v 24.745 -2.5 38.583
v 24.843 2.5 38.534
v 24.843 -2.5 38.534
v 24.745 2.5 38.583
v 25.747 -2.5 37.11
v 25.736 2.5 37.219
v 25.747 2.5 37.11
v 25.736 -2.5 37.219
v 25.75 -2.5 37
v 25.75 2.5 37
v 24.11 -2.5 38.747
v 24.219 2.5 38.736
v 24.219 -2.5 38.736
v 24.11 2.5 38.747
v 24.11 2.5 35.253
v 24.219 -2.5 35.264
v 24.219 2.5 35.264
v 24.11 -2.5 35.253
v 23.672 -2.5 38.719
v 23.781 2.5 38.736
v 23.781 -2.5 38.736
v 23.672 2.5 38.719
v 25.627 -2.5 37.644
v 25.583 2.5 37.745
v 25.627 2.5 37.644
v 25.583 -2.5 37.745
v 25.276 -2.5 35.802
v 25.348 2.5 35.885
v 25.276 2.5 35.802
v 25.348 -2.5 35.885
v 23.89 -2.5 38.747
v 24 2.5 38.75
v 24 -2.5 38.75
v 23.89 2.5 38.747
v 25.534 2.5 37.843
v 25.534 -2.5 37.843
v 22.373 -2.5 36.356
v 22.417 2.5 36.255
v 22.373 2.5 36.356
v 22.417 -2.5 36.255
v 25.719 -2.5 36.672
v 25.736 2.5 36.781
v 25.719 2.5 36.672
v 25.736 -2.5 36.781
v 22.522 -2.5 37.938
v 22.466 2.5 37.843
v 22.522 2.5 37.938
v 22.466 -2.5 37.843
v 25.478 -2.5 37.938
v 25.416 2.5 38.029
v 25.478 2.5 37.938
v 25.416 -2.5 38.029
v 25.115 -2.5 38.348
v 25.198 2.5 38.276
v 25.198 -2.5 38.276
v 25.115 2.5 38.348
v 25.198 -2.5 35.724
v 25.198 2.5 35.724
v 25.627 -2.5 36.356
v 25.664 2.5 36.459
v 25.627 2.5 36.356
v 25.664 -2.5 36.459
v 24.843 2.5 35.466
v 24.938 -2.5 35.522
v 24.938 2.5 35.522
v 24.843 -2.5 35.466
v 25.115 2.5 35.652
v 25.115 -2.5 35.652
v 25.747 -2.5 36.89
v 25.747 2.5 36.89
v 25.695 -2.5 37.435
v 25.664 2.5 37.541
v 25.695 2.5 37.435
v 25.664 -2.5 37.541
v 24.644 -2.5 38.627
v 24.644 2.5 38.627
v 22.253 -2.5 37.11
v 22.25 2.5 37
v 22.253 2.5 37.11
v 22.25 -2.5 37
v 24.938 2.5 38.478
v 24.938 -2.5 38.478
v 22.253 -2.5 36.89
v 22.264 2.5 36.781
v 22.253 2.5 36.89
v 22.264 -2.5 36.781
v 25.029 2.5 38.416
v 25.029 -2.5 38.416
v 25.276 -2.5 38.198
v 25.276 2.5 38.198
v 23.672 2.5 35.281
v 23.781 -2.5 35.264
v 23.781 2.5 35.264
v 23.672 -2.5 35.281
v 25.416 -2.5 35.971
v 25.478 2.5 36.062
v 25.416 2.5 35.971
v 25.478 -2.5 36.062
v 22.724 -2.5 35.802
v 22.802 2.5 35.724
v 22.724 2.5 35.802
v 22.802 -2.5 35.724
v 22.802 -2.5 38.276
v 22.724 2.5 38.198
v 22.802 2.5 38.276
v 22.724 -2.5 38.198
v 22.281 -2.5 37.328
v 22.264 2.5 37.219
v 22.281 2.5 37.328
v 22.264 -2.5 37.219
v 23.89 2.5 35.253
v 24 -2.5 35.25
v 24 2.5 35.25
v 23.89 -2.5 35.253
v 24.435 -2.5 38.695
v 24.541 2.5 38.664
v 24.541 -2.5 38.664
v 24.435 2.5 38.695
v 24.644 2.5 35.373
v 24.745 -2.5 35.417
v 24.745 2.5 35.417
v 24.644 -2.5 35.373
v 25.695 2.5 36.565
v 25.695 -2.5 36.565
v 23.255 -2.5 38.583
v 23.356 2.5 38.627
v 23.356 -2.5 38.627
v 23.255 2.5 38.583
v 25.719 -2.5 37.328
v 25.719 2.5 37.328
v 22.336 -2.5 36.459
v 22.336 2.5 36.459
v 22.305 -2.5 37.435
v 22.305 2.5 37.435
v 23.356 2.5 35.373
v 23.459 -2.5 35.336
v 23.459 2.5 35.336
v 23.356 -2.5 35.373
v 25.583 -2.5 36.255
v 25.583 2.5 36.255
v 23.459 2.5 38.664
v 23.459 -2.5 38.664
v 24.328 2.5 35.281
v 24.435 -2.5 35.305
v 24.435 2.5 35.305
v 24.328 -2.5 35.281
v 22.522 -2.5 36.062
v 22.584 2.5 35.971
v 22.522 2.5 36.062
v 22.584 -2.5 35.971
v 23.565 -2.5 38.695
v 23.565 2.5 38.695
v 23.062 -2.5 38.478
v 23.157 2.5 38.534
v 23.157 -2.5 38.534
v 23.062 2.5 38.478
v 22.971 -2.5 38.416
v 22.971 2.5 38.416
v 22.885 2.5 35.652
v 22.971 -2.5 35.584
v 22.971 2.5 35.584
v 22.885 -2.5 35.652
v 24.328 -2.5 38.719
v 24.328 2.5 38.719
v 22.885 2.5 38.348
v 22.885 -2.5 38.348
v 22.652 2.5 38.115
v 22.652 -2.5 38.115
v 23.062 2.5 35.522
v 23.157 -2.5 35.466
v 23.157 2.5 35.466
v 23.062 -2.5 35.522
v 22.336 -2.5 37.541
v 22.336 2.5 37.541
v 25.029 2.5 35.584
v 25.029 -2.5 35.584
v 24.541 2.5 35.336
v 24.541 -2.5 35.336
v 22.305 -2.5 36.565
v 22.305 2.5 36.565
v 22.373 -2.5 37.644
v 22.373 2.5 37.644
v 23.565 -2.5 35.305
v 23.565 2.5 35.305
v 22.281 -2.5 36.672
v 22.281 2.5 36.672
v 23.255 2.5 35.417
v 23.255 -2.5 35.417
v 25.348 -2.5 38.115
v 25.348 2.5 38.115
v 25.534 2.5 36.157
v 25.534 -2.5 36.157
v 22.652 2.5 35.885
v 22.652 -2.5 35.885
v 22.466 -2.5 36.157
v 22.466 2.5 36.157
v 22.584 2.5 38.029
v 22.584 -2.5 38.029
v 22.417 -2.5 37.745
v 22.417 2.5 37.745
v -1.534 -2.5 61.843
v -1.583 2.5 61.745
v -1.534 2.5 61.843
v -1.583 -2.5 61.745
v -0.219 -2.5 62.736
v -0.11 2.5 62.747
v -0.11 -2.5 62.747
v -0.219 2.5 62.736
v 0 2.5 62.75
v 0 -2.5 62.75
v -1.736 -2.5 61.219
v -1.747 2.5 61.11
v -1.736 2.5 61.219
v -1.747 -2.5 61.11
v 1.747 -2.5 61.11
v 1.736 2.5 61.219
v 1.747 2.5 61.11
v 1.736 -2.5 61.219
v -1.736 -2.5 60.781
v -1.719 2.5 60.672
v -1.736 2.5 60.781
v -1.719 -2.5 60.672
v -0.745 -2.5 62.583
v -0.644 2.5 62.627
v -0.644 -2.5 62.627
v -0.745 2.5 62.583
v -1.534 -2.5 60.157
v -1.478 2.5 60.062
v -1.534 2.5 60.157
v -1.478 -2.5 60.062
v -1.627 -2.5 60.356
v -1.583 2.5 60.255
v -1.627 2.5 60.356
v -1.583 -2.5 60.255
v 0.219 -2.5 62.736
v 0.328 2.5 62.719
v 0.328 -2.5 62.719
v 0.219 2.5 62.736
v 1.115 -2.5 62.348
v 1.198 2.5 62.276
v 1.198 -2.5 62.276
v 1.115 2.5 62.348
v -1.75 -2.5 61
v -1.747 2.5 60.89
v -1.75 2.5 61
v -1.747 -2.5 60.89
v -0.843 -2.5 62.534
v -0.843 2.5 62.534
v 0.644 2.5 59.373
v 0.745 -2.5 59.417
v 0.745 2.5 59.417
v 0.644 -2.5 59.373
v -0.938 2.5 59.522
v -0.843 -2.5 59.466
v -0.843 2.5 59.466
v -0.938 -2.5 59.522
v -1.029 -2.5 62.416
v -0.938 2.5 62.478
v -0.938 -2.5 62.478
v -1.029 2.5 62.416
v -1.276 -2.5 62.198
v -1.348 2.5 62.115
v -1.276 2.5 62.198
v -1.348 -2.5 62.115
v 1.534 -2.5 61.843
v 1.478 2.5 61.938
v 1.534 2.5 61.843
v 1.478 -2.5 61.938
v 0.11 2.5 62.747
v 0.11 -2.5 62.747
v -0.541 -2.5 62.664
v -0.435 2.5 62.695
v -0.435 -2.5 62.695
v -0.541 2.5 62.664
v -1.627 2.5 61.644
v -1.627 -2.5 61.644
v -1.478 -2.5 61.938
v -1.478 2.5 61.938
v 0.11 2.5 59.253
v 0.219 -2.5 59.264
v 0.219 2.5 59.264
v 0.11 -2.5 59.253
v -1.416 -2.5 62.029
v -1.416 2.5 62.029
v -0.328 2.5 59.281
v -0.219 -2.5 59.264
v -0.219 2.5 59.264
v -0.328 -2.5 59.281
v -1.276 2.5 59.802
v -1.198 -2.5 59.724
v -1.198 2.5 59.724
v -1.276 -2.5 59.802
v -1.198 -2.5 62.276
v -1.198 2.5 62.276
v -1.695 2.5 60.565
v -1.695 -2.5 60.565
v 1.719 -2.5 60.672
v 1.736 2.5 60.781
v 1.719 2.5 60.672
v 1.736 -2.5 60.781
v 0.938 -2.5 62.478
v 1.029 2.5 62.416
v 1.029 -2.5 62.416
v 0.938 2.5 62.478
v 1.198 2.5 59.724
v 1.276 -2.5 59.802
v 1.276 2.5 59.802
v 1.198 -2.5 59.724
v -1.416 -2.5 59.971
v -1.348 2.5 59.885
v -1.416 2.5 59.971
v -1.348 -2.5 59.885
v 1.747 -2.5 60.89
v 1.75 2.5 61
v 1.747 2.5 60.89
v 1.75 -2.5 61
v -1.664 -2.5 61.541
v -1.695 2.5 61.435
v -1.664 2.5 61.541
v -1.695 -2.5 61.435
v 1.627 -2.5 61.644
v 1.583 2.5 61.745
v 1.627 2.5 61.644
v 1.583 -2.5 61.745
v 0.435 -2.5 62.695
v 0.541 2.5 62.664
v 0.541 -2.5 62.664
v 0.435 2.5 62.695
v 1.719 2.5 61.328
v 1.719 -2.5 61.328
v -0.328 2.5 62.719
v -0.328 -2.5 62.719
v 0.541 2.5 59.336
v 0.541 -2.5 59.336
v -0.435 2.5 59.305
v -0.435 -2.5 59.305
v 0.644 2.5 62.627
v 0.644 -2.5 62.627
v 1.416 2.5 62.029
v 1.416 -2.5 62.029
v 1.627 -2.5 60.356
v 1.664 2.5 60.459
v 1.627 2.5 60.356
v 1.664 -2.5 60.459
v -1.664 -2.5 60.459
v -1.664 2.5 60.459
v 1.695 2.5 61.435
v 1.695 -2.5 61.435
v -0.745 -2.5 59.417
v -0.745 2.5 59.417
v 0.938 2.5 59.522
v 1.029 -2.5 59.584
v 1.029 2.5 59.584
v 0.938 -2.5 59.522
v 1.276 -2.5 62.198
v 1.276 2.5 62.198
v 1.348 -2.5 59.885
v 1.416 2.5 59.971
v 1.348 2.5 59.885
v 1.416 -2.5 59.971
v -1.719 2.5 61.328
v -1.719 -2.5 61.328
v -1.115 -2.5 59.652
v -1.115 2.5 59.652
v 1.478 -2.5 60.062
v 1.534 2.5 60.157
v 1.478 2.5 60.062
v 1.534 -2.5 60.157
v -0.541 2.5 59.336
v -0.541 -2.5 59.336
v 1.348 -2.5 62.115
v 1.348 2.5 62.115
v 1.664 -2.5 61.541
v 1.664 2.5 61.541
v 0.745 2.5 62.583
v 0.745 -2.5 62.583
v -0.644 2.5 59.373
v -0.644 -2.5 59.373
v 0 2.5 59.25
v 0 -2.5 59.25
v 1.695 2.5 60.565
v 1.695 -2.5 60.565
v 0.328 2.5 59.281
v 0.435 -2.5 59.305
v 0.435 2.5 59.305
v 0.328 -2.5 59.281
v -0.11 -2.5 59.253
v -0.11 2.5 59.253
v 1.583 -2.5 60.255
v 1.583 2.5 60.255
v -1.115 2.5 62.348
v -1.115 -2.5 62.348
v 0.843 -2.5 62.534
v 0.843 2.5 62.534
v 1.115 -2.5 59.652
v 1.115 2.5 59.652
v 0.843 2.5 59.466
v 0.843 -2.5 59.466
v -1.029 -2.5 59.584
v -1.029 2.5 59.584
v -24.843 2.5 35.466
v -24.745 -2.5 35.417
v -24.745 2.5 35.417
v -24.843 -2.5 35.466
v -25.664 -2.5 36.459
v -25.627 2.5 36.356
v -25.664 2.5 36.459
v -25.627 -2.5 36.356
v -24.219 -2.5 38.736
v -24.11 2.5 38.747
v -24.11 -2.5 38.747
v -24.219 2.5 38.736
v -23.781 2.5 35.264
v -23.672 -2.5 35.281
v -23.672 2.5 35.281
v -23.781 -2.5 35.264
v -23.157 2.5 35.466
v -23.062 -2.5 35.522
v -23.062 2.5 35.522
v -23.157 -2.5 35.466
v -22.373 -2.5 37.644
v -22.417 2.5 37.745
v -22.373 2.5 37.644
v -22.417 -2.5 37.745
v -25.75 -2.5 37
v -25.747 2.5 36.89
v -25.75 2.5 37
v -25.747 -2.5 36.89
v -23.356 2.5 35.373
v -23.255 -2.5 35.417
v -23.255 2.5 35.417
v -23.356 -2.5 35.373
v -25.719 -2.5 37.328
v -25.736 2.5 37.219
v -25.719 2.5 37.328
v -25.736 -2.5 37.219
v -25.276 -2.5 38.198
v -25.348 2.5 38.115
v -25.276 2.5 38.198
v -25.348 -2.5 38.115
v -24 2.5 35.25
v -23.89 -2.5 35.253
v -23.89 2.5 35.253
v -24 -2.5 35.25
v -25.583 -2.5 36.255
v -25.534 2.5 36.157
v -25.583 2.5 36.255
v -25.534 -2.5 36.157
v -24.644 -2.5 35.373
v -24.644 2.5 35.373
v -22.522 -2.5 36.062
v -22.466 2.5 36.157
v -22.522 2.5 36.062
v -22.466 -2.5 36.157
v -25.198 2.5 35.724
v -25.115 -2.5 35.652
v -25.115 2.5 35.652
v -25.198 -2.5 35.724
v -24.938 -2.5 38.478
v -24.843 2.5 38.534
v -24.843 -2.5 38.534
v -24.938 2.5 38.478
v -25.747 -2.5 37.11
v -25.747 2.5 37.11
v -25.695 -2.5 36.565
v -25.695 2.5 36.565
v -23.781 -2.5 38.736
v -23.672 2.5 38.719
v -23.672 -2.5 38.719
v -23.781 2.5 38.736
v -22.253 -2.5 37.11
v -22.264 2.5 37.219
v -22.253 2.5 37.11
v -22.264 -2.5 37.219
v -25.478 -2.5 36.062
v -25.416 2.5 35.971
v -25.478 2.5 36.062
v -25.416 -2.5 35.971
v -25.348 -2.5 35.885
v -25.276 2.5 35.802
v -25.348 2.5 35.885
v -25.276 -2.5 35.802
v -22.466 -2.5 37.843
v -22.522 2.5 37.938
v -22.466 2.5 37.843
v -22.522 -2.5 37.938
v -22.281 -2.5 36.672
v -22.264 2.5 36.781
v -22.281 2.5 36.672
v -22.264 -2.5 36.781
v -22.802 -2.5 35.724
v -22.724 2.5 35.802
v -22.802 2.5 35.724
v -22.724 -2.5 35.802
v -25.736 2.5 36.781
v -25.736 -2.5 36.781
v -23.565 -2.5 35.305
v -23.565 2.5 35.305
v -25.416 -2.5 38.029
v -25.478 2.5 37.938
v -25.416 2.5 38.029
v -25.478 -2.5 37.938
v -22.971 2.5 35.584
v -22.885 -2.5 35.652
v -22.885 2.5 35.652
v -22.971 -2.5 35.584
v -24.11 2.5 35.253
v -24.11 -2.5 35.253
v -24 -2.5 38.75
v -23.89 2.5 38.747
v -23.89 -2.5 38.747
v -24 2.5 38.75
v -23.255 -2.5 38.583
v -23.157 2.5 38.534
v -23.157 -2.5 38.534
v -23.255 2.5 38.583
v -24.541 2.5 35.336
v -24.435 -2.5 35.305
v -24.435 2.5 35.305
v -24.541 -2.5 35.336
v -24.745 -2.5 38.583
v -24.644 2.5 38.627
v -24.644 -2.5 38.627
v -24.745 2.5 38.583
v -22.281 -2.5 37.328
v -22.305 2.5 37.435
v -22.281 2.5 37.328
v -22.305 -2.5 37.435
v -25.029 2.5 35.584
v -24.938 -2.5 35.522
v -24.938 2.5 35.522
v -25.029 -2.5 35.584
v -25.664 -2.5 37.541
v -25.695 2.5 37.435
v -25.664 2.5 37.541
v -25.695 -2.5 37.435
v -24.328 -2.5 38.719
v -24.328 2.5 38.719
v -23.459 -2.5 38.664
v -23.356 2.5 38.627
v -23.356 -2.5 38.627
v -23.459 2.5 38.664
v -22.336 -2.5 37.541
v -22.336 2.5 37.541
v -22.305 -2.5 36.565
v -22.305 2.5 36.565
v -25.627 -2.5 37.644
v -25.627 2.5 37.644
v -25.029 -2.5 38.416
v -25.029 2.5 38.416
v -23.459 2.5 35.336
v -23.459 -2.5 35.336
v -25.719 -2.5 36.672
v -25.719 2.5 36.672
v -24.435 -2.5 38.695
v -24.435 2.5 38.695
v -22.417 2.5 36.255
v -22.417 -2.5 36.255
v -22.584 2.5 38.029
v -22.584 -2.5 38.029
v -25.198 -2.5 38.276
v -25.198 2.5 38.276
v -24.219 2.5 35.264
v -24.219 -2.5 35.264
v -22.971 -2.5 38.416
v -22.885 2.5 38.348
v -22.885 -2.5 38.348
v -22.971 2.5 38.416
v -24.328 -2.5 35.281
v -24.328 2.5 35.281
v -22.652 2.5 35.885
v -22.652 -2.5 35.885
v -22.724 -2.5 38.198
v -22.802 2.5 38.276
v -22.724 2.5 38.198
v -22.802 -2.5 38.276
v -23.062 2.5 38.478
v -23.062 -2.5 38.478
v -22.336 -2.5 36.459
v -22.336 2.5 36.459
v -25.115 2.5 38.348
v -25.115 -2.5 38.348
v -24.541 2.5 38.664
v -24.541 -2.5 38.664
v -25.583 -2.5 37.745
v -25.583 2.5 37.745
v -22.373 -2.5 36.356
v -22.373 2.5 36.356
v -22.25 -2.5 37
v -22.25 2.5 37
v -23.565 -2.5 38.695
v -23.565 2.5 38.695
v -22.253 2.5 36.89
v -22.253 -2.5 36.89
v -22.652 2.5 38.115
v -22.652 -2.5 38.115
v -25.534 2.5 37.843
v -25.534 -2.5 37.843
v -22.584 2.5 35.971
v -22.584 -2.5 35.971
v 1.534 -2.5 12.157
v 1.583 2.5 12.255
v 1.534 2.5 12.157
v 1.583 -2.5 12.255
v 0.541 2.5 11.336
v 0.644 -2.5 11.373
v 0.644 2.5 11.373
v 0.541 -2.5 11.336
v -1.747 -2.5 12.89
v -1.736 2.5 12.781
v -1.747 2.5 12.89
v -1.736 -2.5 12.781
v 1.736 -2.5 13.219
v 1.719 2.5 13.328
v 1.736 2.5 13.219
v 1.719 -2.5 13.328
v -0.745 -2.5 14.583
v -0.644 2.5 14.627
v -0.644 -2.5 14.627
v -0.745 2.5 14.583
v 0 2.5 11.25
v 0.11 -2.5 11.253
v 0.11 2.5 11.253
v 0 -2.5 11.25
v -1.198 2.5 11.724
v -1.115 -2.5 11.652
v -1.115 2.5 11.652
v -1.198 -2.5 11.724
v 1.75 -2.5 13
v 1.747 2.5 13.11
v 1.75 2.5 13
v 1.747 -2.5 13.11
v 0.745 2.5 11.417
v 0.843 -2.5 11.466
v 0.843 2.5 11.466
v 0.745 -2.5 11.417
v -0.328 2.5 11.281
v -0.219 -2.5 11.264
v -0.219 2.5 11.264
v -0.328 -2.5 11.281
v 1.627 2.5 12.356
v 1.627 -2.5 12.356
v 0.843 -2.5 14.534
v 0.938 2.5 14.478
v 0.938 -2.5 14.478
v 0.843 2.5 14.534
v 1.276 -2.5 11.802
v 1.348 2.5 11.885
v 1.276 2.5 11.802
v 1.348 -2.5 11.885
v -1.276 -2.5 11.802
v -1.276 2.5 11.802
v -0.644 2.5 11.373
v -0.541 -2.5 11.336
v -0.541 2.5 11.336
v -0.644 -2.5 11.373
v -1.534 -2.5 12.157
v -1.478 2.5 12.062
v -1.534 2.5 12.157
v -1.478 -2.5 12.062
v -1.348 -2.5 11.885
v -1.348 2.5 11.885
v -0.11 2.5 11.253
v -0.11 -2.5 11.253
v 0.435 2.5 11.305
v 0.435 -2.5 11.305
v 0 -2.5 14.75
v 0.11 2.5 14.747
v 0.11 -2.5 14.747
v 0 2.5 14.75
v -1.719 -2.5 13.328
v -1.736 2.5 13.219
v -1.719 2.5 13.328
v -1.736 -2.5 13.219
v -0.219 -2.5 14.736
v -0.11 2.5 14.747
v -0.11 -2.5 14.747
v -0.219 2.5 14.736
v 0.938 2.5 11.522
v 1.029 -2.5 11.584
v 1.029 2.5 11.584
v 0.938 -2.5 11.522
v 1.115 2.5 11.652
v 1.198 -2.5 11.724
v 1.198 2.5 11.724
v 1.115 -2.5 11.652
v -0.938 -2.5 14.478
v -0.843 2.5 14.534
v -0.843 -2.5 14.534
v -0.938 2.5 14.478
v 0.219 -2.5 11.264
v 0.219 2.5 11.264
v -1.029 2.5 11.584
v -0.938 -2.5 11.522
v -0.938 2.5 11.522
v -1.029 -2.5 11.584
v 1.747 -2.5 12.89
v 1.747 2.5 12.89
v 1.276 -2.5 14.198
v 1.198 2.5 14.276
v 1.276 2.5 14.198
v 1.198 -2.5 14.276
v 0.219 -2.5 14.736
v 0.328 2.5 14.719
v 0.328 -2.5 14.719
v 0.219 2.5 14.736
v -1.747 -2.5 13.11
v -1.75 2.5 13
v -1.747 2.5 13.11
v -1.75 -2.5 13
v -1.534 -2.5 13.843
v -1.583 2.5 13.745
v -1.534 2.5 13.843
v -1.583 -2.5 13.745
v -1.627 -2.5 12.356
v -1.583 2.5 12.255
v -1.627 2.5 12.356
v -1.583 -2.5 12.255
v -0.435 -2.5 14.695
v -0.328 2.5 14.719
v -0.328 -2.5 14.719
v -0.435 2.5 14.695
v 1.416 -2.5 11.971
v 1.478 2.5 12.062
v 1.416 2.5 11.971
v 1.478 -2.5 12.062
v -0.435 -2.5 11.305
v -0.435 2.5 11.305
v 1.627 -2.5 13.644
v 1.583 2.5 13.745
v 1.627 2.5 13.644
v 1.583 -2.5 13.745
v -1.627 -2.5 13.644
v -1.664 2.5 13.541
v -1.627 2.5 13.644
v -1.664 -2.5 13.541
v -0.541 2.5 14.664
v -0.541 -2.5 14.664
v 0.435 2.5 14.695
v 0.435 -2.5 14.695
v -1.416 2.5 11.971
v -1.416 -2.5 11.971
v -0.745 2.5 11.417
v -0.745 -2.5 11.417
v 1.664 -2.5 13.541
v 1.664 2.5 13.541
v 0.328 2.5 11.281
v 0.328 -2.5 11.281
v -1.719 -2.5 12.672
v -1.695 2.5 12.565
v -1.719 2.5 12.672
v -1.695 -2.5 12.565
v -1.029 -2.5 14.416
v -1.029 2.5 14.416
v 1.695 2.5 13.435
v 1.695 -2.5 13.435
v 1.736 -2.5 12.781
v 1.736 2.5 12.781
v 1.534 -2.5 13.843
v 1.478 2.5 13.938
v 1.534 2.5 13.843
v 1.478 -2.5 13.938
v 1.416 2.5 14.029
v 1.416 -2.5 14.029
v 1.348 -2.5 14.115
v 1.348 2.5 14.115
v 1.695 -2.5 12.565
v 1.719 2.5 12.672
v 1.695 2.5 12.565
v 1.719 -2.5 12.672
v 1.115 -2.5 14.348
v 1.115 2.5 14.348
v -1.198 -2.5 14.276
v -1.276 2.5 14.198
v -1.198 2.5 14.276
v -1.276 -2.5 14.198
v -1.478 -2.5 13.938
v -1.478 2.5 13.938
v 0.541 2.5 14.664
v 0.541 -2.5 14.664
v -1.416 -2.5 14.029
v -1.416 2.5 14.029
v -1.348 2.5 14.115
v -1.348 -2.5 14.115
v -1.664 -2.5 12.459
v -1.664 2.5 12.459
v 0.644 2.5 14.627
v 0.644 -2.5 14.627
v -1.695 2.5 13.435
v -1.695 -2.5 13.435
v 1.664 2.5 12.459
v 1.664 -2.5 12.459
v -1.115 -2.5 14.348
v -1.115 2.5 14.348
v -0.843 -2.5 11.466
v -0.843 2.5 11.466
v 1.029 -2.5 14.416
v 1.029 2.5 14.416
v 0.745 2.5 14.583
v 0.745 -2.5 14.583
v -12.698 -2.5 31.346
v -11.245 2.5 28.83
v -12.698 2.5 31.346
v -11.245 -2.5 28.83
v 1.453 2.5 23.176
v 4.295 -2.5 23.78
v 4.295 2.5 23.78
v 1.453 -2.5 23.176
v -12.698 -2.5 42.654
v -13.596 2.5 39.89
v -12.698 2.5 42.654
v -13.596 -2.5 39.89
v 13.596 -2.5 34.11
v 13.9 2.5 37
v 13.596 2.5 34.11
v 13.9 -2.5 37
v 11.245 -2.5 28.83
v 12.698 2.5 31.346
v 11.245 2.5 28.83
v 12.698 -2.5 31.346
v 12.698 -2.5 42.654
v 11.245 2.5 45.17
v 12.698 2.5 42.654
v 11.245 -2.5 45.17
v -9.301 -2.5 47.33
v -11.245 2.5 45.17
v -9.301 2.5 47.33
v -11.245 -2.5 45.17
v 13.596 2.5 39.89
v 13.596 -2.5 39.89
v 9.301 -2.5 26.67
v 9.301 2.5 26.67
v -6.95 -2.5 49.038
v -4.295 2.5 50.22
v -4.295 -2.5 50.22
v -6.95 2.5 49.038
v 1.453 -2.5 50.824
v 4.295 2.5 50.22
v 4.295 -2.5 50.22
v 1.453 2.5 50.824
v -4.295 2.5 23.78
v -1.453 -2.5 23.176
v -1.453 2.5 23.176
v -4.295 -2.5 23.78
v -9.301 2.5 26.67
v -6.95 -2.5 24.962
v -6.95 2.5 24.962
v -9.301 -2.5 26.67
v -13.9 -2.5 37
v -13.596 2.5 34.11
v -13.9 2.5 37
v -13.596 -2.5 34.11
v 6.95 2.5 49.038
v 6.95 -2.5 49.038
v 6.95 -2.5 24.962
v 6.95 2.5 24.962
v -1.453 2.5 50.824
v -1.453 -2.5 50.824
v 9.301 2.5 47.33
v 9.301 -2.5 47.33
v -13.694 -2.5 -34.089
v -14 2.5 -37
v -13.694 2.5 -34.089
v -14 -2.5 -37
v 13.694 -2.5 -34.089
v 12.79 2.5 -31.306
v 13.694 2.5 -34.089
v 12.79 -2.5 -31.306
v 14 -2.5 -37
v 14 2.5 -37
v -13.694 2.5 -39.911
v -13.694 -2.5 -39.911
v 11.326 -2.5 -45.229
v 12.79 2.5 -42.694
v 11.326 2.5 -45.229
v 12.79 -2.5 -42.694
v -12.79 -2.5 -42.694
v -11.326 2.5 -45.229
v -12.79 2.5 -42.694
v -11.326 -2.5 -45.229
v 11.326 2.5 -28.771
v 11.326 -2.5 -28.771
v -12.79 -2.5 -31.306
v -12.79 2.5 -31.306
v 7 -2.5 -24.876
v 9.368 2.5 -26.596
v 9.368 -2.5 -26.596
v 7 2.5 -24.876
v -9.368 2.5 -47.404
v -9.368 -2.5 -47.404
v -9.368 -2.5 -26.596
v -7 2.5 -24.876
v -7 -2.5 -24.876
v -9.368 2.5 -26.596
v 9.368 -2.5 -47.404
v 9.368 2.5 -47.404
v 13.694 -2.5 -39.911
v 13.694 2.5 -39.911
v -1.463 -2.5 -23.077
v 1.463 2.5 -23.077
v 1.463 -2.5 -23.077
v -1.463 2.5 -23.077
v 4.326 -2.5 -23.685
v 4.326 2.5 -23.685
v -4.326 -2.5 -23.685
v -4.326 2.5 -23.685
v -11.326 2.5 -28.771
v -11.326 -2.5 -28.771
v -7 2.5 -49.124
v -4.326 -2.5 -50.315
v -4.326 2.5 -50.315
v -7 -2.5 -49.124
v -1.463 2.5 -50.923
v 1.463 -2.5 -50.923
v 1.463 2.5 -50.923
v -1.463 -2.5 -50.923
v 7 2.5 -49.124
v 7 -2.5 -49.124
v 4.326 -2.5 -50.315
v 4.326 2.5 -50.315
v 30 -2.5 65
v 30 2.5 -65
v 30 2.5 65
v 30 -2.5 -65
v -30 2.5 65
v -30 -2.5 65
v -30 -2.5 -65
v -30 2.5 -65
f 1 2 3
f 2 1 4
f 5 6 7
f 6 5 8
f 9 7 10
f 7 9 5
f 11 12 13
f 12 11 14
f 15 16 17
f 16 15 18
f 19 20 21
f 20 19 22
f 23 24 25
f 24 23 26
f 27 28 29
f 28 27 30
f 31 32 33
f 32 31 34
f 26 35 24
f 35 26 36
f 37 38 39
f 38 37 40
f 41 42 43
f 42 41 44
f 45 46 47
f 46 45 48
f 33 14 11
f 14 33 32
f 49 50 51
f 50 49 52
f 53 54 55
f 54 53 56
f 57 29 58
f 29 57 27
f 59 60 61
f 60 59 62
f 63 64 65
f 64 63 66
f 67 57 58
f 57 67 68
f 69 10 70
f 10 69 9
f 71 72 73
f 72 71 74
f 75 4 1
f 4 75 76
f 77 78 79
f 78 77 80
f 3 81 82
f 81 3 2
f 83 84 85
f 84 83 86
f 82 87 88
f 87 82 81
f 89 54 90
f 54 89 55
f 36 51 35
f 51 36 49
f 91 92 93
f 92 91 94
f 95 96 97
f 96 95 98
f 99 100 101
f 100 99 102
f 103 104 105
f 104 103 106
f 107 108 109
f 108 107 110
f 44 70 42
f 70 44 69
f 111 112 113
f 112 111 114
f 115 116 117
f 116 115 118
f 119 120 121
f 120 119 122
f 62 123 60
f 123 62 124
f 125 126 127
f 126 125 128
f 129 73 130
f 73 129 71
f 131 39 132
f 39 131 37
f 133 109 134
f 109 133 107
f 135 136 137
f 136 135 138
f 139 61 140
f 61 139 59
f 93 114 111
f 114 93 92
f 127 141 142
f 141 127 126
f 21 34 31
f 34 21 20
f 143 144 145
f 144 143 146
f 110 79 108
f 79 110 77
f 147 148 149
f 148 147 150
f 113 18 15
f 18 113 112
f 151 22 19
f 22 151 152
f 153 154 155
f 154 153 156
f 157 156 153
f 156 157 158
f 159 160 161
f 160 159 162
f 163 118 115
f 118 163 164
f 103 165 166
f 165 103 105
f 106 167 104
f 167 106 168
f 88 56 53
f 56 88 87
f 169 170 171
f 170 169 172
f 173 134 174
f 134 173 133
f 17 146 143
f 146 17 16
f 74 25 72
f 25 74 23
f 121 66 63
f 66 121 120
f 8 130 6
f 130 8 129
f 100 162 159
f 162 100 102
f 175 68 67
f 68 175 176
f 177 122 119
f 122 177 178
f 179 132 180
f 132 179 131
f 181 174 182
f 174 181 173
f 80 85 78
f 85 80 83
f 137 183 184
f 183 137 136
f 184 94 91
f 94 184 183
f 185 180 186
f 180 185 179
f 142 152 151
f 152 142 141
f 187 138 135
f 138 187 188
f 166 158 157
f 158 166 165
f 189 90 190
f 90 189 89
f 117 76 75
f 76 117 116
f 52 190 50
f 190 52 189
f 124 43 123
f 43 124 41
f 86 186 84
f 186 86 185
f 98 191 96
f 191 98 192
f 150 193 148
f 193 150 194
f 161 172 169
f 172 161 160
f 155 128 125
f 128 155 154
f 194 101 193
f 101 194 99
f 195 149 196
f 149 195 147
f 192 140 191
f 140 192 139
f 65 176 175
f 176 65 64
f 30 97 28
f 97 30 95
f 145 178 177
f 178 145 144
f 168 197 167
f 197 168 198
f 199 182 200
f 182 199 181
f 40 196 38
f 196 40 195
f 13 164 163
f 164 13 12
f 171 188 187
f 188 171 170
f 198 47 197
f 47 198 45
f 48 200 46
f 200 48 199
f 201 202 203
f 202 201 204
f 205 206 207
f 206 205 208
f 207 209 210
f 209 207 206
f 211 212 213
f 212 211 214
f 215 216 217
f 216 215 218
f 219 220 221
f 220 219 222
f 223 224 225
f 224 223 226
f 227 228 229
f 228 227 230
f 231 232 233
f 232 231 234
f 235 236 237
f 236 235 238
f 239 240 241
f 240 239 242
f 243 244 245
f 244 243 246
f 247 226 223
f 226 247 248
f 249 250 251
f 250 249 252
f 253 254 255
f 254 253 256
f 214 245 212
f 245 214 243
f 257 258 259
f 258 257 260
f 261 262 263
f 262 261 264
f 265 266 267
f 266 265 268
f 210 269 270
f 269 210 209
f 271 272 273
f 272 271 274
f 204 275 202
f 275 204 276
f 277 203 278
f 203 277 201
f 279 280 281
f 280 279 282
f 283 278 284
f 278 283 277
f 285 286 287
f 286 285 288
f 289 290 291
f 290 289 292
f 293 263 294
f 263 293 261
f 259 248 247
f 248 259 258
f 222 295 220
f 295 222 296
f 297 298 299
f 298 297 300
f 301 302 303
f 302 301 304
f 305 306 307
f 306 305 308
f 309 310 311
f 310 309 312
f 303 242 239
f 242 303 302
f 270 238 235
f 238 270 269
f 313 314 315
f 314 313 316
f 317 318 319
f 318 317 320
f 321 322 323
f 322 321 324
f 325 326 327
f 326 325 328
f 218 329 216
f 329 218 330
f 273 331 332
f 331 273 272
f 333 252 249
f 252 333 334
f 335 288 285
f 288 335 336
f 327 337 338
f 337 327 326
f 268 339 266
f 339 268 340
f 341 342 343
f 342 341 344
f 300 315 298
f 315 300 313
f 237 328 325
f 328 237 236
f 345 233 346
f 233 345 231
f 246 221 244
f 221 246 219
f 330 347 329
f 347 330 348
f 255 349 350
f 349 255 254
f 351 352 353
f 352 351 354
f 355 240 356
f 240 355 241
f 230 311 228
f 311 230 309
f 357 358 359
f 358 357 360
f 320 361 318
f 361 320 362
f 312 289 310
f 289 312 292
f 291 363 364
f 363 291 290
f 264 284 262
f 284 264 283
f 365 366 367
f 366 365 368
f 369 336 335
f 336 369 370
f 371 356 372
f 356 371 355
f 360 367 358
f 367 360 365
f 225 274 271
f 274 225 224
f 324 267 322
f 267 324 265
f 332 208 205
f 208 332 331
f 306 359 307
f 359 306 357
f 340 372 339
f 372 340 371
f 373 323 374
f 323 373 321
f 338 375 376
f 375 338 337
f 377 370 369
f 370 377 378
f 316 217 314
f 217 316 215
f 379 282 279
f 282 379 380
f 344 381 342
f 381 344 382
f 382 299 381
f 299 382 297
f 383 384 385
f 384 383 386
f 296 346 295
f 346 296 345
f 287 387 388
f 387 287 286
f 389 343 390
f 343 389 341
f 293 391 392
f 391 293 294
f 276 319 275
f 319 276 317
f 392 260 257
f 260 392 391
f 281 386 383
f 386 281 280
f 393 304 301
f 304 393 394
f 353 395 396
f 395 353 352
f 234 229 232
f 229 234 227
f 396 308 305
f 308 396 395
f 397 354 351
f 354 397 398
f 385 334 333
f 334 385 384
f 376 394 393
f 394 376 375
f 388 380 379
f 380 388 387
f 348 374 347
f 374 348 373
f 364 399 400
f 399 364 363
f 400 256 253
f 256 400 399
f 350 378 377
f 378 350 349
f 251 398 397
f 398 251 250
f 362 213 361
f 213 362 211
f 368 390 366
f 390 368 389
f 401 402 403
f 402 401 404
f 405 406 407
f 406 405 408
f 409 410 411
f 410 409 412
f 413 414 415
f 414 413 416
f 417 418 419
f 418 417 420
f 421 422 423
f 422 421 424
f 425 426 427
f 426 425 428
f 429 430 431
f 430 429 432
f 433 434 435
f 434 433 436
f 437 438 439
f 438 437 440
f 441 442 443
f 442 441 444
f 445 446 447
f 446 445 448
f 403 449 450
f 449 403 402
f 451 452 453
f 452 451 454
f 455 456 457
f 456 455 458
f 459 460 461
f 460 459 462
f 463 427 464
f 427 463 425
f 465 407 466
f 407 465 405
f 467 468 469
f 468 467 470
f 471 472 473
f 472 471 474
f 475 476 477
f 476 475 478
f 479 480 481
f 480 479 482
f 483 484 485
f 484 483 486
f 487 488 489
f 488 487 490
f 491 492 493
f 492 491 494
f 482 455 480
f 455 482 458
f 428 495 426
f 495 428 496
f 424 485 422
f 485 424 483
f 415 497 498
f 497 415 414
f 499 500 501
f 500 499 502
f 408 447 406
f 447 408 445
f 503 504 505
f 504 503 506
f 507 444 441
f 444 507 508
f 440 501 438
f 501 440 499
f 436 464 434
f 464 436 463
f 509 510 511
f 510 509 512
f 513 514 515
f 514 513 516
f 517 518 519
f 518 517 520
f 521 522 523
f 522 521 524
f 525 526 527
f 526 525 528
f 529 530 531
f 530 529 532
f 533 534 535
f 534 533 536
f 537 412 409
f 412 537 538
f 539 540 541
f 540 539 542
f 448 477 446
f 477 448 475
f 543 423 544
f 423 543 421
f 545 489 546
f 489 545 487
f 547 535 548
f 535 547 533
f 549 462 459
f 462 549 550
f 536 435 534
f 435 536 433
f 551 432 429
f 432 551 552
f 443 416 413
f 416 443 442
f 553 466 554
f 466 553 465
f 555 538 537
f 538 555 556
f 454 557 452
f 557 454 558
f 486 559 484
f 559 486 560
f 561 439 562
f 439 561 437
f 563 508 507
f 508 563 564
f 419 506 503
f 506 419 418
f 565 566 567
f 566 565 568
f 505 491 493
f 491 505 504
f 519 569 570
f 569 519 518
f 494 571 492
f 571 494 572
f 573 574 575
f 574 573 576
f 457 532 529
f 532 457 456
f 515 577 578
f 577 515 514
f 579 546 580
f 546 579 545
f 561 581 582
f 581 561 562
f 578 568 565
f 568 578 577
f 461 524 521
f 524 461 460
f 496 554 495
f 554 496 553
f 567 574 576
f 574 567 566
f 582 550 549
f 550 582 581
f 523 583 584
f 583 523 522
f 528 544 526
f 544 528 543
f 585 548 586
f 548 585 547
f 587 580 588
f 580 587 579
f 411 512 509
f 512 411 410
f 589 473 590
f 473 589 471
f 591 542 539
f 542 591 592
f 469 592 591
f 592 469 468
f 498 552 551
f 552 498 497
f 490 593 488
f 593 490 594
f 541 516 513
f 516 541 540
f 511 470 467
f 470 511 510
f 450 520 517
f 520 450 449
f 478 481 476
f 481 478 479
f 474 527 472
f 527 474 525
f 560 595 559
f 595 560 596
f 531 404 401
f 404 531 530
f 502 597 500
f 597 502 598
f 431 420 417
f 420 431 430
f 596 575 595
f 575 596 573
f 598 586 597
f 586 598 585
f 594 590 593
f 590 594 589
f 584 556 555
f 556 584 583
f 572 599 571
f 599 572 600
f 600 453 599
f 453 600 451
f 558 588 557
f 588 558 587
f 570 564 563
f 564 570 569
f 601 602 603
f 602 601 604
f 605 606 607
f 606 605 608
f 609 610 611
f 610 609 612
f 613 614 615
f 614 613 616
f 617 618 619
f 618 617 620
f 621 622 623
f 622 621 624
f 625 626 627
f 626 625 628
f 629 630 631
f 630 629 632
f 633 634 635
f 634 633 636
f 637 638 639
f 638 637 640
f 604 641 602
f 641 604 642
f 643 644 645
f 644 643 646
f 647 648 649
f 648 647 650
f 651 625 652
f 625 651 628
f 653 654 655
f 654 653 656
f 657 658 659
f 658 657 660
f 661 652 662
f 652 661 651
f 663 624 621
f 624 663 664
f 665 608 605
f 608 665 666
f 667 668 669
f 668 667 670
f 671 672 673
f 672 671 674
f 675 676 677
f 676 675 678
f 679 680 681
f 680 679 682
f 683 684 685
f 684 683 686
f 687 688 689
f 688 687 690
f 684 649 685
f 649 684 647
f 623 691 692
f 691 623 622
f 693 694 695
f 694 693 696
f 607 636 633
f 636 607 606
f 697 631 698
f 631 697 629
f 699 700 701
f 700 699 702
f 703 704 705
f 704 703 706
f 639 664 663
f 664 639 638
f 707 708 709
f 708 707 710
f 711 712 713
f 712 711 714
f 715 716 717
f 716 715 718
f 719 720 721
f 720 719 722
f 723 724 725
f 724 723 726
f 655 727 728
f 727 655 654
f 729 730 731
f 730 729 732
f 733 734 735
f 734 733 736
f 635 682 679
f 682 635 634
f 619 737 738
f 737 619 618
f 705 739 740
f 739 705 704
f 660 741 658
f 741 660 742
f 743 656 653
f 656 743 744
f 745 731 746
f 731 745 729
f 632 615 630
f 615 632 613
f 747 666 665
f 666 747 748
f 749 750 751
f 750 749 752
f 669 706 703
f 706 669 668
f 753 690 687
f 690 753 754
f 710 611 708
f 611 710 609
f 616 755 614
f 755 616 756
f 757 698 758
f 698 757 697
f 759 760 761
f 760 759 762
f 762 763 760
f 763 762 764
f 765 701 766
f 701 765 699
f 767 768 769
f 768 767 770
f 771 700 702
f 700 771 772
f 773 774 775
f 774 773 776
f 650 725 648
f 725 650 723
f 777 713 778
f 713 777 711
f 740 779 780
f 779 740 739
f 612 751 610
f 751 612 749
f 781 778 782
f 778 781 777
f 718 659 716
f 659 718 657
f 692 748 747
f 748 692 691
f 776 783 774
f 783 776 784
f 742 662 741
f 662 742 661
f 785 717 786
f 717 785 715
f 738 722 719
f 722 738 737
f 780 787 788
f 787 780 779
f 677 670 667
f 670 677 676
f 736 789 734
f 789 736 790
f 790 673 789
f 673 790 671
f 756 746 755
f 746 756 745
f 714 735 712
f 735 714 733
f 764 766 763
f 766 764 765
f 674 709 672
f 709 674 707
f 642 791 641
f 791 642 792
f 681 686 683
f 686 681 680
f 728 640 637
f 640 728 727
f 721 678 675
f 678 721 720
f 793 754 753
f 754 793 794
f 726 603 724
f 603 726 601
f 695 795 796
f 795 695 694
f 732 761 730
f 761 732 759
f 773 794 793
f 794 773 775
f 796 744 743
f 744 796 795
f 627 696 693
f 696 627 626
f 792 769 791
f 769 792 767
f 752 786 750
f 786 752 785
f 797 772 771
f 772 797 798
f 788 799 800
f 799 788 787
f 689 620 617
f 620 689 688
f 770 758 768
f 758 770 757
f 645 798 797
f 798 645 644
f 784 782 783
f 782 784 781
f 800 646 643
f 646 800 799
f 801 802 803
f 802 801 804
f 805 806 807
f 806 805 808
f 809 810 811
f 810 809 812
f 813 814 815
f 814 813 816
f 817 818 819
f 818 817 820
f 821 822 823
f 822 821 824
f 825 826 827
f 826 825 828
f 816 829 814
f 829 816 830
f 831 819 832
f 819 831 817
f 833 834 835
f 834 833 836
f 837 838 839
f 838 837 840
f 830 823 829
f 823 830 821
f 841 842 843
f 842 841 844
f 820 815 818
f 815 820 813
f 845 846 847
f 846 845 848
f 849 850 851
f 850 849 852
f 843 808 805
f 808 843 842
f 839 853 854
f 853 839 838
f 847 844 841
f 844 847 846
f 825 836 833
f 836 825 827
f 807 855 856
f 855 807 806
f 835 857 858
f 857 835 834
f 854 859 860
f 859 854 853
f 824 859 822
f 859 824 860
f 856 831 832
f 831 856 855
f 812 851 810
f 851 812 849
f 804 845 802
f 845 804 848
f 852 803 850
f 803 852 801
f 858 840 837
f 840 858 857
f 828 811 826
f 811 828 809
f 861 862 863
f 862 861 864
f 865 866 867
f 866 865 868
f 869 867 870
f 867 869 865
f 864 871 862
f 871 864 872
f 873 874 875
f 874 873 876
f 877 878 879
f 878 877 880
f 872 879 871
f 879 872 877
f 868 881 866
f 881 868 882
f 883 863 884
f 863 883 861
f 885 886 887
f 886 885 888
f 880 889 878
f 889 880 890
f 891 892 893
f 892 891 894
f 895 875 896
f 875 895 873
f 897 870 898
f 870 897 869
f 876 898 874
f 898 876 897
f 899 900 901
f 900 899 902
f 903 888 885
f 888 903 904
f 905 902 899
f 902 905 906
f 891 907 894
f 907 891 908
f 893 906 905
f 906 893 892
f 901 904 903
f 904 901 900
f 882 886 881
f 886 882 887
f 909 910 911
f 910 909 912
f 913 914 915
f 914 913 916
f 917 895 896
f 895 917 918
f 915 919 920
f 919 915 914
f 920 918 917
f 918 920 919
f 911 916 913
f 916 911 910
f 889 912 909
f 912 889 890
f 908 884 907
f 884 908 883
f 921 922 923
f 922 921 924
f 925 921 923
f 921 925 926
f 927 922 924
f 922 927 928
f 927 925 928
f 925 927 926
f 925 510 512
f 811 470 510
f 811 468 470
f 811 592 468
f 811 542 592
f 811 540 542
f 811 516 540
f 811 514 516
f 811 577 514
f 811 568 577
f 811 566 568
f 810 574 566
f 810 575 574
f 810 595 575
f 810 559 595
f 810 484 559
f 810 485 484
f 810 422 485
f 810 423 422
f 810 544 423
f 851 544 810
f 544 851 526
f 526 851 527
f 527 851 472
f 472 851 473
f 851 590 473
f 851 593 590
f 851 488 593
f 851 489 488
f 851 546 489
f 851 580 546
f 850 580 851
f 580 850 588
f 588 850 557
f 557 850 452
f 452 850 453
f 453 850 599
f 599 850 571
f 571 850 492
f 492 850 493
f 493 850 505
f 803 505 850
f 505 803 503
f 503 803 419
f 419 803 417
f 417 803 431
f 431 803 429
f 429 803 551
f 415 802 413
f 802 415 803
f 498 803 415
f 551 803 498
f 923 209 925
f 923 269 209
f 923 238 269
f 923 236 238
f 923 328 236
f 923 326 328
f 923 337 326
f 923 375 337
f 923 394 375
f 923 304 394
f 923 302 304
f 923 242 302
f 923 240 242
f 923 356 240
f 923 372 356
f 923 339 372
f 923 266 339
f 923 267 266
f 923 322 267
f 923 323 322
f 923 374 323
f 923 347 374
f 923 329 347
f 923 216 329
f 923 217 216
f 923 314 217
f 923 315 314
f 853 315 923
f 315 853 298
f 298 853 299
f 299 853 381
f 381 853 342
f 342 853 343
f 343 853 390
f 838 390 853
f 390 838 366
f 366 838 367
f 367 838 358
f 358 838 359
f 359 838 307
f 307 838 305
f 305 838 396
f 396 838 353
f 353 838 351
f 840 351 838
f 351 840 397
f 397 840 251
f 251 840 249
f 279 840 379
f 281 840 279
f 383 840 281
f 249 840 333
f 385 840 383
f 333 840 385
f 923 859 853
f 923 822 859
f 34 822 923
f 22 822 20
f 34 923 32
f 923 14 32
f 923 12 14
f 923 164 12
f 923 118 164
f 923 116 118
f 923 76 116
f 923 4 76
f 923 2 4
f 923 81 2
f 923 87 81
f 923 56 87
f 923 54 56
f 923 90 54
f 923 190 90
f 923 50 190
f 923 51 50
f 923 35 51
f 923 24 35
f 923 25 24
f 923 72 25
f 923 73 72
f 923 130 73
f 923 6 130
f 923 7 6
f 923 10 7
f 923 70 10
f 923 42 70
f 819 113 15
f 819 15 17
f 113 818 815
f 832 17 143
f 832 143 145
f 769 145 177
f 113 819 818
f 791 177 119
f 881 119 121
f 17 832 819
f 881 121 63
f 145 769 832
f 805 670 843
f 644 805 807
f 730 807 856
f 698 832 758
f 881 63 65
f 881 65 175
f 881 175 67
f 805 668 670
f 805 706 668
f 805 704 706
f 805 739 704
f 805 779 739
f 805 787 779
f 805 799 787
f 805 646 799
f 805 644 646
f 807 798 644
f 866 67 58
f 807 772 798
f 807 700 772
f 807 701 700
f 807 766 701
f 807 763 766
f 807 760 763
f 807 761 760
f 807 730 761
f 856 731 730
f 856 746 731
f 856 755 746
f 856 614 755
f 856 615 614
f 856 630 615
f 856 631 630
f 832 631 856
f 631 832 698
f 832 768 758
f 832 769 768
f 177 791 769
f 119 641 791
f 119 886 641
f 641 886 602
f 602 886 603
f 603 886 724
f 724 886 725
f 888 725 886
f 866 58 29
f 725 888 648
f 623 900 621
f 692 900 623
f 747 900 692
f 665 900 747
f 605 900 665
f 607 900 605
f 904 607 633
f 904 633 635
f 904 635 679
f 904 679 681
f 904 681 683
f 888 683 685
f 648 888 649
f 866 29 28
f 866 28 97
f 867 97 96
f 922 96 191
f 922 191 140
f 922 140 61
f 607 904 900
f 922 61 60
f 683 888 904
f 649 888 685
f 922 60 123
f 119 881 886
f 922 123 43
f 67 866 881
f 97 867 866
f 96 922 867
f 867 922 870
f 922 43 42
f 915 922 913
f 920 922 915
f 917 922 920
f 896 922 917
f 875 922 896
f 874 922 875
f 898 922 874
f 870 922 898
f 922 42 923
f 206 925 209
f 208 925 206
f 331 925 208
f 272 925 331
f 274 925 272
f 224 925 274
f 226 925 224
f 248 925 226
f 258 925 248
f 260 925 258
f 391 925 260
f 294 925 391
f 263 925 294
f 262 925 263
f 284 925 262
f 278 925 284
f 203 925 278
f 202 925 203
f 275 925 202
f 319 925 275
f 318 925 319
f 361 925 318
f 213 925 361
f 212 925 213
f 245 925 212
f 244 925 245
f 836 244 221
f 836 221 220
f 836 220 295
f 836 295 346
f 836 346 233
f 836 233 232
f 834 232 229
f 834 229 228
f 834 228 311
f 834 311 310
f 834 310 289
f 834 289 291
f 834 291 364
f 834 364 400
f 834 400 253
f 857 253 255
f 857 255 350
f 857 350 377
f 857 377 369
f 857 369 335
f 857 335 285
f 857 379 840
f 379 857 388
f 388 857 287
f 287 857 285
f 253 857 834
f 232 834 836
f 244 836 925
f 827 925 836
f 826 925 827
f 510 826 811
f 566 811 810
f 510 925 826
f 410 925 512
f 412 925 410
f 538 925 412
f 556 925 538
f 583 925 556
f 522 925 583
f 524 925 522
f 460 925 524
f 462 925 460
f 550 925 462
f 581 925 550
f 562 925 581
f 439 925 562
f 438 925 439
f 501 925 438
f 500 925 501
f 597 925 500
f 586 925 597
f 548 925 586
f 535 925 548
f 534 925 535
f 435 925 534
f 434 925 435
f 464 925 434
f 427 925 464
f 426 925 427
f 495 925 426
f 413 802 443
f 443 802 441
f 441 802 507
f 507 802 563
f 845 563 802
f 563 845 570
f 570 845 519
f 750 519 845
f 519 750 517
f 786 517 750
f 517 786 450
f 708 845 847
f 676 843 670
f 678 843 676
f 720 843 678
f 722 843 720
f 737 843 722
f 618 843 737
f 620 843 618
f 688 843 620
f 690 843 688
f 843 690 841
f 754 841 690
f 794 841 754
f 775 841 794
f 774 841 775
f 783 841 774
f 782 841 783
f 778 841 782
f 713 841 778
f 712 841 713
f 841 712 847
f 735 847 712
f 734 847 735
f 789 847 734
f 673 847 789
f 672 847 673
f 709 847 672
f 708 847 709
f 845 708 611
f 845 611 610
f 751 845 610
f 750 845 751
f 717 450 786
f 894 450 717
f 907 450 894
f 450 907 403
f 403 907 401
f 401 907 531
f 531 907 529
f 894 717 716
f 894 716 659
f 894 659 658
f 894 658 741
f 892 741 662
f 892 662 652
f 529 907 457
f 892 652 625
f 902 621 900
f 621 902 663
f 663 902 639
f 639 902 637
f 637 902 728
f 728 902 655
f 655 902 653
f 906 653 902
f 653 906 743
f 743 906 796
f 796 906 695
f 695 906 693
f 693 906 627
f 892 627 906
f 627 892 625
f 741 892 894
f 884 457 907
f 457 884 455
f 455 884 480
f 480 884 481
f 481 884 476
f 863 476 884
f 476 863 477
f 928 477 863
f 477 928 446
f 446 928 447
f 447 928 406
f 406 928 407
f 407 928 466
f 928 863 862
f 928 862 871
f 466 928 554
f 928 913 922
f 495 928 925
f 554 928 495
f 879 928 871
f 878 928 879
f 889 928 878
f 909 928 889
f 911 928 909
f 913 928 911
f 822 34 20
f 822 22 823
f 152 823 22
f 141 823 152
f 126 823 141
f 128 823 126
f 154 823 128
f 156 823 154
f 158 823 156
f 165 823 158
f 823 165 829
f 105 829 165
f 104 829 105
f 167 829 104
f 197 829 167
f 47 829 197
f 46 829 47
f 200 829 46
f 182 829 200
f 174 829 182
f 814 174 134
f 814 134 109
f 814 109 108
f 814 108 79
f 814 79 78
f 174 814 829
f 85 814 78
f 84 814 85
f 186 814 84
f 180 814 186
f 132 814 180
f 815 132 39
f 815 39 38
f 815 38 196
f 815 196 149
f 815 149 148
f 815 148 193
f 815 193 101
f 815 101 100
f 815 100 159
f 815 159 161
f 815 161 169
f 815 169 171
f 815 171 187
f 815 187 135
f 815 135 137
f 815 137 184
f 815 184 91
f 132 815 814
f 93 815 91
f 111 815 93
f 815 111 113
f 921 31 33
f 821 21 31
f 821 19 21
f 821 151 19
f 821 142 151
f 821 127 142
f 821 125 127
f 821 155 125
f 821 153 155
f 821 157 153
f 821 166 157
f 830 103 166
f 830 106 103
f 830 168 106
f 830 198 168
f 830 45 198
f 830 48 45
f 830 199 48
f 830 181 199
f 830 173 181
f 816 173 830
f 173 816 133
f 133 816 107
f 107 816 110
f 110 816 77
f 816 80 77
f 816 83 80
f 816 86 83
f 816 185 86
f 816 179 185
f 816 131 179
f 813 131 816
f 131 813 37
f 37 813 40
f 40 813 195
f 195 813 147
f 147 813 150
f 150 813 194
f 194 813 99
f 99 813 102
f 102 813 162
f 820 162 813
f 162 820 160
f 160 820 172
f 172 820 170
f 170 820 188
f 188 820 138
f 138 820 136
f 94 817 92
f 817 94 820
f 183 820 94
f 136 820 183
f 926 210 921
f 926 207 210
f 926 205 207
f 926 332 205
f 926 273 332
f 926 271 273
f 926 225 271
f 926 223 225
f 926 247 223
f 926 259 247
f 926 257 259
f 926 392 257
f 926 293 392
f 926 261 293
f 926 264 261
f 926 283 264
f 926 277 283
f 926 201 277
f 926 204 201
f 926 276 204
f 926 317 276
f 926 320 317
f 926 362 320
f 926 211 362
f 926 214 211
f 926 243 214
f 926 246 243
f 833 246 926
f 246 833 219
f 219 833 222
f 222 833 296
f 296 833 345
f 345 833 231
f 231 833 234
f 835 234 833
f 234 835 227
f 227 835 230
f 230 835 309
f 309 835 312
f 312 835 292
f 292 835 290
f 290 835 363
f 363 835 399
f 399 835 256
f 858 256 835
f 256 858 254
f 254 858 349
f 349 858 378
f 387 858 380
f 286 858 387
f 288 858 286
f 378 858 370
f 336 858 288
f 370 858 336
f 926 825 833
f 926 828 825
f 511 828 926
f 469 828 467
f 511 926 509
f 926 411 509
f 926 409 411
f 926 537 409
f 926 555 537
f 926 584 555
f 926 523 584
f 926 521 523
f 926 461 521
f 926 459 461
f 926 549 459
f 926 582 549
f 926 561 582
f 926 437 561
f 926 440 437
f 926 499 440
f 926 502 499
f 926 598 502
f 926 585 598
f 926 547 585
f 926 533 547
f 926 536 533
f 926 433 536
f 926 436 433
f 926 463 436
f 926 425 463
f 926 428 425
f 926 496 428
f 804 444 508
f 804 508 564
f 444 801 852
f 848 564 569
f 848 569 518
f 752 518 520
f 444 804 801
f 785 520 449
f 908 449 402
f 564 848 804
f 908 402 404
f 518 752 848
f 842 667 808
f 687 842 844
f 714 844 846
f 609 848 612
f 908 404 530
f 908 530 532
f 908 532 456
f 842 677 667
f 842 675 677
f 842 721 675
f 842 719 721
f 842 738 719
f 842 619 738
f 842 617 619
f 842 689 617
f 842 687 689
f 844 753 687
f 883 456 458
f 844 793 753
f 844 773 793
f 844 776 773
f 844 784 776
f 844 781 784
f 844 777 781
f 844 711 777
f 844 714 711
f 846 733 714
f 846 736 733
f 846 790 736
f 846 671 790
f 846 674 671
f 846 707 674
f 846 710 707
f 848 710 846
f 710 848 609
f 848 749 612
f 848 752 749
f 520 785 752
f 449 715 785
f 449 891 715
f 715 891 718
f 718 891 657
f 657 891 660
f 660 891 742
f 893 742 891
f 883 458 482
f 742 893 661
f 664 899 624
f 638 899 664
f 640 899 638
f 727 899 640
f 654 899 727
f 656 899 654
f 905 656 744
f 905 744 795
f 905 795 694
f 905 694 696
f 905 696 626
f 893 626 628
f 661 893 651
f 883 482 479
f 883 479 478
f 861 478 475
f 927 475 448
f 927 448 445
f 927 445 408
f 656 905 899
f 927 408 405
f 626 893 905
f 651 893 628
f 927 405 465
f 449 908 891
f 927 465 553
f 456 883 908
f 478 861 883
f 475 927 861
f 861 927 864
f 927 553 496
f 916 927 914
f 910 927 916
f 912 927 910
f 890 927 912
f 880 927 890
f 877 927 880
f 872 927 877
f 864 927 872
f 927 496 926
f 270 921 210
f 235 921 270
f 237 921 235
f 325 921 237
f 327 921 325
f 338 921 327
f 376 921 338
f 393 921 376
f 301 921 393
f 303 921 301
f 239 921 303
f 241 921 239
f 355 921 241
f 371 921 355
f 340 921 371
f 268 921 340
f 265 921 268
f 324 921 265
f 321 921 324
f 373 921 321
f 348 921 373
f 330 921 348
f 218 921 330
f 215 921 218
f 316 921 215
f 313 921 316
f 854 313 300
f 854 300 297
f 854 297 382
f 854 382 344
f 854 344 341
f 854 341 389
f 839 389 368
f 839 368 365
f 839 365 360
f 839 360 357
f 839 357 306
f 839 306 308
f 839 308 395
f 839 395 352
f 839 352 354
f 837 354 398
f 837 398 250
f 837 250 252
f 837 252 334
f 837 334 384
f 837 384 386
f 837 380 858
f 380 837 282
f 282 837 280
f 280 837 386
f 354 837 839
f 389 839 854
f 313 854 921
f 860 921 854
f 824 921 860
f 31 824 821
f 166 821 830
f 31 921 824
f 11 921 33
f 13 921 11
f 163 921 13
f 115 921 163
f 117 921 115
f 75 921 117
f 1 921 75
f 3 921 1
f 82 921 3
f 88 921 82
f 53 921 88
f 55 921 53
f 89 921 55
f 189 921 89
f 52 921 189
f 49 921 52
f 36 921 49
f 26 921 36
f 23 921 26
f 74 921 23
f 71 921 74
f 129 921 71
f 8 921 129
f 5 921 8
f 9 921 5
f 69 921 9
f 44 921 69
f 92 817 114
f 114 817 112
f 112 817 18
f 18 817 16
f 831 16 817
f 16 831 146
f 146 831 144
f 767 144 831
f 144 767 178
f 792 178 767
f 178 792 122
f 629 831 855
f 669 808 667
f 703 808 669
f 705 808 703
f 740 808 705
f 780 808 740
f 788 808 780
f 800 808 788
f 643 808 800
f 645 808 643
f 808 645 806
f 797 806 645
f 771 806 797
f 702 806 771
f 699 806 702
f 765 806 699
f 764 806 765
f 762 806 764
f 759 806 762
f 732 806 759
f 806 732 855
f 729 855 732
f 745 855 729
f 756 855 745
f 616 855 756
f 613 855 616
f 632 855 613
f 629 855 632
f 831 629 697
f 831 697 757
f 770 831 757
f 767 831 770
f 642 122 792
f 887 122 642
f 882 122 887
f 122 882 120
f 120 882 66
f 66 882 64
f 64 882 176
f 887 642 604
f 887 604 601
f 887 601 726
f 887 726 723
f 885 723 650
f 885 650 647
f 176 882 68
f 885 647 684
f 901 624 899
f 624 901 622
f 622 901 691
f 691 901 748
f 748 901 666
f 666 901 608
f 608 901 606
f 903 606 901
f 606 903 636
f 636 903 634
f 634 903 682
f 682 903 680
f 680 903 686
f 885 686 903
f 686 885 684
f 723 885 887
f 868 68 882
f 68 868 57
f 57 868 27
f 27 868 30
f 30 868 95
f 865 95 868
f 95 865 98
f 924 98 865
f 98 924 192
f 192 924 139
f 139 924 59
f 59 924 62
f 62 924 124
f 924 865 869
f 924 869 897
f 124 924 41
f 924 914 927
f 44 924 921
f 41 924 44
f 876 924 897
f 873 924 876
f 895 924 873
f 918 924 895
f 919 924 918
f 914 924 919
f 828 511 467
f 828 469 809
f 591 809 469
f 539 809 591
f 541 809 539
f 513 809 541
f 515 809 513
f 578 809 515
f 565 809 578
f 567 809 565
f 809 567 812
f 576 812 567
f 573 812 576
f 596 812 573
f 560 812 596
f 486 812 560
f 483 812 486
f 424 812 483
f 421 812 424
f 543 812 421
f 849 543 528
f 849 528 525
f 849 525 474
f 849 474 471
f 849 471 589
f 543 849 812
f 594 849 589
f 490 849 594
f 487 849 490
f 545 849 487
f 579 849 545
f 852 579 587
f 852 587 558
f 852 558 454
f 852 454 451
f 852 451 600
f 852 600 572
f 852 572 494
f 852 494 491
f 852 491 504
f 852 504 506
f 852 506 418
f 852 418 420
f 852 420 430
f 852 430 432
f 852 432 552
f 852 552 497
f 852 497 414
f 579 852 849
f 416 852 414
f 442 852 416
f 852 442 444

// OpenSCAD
height  = 130;
width = 60;
thickness = 5;

motor_diameter  = 27.8;
motor_holes_center_to_center = 48;
turbidity_diameter = 28;
separation_center_to_center = 74;

difference() {
cube([width, thickness, height], center = true);
translate([0, 0, height / 2])
{
    {

            // motor
            translate([0, 0, -height / 2 + separation_center_to_center/2])
                rotate([90, 0, 0])
                    color("grey") union() {
                        cylinder(d = motor_diameter, h = thickness + 1, center = true);
                        for(i=[0:3]){
                            rotate([0, 0, i * 90])
                                translate([motor_holes_center_to_center / 2, 0, 0])
                                    cylinder(d = 3.5, h = thickness + 1, center = true, $fn = 100);
                        }
                        }

            // turbidity
            translate([0, 0, -height / 2 - separation_center_to_center/2])  
                rotate([90, 0, 0])
                    color("green") cylinder(d = turbidity_diameter, h = thickness + 1, center = true);
            
        
    }
}}
